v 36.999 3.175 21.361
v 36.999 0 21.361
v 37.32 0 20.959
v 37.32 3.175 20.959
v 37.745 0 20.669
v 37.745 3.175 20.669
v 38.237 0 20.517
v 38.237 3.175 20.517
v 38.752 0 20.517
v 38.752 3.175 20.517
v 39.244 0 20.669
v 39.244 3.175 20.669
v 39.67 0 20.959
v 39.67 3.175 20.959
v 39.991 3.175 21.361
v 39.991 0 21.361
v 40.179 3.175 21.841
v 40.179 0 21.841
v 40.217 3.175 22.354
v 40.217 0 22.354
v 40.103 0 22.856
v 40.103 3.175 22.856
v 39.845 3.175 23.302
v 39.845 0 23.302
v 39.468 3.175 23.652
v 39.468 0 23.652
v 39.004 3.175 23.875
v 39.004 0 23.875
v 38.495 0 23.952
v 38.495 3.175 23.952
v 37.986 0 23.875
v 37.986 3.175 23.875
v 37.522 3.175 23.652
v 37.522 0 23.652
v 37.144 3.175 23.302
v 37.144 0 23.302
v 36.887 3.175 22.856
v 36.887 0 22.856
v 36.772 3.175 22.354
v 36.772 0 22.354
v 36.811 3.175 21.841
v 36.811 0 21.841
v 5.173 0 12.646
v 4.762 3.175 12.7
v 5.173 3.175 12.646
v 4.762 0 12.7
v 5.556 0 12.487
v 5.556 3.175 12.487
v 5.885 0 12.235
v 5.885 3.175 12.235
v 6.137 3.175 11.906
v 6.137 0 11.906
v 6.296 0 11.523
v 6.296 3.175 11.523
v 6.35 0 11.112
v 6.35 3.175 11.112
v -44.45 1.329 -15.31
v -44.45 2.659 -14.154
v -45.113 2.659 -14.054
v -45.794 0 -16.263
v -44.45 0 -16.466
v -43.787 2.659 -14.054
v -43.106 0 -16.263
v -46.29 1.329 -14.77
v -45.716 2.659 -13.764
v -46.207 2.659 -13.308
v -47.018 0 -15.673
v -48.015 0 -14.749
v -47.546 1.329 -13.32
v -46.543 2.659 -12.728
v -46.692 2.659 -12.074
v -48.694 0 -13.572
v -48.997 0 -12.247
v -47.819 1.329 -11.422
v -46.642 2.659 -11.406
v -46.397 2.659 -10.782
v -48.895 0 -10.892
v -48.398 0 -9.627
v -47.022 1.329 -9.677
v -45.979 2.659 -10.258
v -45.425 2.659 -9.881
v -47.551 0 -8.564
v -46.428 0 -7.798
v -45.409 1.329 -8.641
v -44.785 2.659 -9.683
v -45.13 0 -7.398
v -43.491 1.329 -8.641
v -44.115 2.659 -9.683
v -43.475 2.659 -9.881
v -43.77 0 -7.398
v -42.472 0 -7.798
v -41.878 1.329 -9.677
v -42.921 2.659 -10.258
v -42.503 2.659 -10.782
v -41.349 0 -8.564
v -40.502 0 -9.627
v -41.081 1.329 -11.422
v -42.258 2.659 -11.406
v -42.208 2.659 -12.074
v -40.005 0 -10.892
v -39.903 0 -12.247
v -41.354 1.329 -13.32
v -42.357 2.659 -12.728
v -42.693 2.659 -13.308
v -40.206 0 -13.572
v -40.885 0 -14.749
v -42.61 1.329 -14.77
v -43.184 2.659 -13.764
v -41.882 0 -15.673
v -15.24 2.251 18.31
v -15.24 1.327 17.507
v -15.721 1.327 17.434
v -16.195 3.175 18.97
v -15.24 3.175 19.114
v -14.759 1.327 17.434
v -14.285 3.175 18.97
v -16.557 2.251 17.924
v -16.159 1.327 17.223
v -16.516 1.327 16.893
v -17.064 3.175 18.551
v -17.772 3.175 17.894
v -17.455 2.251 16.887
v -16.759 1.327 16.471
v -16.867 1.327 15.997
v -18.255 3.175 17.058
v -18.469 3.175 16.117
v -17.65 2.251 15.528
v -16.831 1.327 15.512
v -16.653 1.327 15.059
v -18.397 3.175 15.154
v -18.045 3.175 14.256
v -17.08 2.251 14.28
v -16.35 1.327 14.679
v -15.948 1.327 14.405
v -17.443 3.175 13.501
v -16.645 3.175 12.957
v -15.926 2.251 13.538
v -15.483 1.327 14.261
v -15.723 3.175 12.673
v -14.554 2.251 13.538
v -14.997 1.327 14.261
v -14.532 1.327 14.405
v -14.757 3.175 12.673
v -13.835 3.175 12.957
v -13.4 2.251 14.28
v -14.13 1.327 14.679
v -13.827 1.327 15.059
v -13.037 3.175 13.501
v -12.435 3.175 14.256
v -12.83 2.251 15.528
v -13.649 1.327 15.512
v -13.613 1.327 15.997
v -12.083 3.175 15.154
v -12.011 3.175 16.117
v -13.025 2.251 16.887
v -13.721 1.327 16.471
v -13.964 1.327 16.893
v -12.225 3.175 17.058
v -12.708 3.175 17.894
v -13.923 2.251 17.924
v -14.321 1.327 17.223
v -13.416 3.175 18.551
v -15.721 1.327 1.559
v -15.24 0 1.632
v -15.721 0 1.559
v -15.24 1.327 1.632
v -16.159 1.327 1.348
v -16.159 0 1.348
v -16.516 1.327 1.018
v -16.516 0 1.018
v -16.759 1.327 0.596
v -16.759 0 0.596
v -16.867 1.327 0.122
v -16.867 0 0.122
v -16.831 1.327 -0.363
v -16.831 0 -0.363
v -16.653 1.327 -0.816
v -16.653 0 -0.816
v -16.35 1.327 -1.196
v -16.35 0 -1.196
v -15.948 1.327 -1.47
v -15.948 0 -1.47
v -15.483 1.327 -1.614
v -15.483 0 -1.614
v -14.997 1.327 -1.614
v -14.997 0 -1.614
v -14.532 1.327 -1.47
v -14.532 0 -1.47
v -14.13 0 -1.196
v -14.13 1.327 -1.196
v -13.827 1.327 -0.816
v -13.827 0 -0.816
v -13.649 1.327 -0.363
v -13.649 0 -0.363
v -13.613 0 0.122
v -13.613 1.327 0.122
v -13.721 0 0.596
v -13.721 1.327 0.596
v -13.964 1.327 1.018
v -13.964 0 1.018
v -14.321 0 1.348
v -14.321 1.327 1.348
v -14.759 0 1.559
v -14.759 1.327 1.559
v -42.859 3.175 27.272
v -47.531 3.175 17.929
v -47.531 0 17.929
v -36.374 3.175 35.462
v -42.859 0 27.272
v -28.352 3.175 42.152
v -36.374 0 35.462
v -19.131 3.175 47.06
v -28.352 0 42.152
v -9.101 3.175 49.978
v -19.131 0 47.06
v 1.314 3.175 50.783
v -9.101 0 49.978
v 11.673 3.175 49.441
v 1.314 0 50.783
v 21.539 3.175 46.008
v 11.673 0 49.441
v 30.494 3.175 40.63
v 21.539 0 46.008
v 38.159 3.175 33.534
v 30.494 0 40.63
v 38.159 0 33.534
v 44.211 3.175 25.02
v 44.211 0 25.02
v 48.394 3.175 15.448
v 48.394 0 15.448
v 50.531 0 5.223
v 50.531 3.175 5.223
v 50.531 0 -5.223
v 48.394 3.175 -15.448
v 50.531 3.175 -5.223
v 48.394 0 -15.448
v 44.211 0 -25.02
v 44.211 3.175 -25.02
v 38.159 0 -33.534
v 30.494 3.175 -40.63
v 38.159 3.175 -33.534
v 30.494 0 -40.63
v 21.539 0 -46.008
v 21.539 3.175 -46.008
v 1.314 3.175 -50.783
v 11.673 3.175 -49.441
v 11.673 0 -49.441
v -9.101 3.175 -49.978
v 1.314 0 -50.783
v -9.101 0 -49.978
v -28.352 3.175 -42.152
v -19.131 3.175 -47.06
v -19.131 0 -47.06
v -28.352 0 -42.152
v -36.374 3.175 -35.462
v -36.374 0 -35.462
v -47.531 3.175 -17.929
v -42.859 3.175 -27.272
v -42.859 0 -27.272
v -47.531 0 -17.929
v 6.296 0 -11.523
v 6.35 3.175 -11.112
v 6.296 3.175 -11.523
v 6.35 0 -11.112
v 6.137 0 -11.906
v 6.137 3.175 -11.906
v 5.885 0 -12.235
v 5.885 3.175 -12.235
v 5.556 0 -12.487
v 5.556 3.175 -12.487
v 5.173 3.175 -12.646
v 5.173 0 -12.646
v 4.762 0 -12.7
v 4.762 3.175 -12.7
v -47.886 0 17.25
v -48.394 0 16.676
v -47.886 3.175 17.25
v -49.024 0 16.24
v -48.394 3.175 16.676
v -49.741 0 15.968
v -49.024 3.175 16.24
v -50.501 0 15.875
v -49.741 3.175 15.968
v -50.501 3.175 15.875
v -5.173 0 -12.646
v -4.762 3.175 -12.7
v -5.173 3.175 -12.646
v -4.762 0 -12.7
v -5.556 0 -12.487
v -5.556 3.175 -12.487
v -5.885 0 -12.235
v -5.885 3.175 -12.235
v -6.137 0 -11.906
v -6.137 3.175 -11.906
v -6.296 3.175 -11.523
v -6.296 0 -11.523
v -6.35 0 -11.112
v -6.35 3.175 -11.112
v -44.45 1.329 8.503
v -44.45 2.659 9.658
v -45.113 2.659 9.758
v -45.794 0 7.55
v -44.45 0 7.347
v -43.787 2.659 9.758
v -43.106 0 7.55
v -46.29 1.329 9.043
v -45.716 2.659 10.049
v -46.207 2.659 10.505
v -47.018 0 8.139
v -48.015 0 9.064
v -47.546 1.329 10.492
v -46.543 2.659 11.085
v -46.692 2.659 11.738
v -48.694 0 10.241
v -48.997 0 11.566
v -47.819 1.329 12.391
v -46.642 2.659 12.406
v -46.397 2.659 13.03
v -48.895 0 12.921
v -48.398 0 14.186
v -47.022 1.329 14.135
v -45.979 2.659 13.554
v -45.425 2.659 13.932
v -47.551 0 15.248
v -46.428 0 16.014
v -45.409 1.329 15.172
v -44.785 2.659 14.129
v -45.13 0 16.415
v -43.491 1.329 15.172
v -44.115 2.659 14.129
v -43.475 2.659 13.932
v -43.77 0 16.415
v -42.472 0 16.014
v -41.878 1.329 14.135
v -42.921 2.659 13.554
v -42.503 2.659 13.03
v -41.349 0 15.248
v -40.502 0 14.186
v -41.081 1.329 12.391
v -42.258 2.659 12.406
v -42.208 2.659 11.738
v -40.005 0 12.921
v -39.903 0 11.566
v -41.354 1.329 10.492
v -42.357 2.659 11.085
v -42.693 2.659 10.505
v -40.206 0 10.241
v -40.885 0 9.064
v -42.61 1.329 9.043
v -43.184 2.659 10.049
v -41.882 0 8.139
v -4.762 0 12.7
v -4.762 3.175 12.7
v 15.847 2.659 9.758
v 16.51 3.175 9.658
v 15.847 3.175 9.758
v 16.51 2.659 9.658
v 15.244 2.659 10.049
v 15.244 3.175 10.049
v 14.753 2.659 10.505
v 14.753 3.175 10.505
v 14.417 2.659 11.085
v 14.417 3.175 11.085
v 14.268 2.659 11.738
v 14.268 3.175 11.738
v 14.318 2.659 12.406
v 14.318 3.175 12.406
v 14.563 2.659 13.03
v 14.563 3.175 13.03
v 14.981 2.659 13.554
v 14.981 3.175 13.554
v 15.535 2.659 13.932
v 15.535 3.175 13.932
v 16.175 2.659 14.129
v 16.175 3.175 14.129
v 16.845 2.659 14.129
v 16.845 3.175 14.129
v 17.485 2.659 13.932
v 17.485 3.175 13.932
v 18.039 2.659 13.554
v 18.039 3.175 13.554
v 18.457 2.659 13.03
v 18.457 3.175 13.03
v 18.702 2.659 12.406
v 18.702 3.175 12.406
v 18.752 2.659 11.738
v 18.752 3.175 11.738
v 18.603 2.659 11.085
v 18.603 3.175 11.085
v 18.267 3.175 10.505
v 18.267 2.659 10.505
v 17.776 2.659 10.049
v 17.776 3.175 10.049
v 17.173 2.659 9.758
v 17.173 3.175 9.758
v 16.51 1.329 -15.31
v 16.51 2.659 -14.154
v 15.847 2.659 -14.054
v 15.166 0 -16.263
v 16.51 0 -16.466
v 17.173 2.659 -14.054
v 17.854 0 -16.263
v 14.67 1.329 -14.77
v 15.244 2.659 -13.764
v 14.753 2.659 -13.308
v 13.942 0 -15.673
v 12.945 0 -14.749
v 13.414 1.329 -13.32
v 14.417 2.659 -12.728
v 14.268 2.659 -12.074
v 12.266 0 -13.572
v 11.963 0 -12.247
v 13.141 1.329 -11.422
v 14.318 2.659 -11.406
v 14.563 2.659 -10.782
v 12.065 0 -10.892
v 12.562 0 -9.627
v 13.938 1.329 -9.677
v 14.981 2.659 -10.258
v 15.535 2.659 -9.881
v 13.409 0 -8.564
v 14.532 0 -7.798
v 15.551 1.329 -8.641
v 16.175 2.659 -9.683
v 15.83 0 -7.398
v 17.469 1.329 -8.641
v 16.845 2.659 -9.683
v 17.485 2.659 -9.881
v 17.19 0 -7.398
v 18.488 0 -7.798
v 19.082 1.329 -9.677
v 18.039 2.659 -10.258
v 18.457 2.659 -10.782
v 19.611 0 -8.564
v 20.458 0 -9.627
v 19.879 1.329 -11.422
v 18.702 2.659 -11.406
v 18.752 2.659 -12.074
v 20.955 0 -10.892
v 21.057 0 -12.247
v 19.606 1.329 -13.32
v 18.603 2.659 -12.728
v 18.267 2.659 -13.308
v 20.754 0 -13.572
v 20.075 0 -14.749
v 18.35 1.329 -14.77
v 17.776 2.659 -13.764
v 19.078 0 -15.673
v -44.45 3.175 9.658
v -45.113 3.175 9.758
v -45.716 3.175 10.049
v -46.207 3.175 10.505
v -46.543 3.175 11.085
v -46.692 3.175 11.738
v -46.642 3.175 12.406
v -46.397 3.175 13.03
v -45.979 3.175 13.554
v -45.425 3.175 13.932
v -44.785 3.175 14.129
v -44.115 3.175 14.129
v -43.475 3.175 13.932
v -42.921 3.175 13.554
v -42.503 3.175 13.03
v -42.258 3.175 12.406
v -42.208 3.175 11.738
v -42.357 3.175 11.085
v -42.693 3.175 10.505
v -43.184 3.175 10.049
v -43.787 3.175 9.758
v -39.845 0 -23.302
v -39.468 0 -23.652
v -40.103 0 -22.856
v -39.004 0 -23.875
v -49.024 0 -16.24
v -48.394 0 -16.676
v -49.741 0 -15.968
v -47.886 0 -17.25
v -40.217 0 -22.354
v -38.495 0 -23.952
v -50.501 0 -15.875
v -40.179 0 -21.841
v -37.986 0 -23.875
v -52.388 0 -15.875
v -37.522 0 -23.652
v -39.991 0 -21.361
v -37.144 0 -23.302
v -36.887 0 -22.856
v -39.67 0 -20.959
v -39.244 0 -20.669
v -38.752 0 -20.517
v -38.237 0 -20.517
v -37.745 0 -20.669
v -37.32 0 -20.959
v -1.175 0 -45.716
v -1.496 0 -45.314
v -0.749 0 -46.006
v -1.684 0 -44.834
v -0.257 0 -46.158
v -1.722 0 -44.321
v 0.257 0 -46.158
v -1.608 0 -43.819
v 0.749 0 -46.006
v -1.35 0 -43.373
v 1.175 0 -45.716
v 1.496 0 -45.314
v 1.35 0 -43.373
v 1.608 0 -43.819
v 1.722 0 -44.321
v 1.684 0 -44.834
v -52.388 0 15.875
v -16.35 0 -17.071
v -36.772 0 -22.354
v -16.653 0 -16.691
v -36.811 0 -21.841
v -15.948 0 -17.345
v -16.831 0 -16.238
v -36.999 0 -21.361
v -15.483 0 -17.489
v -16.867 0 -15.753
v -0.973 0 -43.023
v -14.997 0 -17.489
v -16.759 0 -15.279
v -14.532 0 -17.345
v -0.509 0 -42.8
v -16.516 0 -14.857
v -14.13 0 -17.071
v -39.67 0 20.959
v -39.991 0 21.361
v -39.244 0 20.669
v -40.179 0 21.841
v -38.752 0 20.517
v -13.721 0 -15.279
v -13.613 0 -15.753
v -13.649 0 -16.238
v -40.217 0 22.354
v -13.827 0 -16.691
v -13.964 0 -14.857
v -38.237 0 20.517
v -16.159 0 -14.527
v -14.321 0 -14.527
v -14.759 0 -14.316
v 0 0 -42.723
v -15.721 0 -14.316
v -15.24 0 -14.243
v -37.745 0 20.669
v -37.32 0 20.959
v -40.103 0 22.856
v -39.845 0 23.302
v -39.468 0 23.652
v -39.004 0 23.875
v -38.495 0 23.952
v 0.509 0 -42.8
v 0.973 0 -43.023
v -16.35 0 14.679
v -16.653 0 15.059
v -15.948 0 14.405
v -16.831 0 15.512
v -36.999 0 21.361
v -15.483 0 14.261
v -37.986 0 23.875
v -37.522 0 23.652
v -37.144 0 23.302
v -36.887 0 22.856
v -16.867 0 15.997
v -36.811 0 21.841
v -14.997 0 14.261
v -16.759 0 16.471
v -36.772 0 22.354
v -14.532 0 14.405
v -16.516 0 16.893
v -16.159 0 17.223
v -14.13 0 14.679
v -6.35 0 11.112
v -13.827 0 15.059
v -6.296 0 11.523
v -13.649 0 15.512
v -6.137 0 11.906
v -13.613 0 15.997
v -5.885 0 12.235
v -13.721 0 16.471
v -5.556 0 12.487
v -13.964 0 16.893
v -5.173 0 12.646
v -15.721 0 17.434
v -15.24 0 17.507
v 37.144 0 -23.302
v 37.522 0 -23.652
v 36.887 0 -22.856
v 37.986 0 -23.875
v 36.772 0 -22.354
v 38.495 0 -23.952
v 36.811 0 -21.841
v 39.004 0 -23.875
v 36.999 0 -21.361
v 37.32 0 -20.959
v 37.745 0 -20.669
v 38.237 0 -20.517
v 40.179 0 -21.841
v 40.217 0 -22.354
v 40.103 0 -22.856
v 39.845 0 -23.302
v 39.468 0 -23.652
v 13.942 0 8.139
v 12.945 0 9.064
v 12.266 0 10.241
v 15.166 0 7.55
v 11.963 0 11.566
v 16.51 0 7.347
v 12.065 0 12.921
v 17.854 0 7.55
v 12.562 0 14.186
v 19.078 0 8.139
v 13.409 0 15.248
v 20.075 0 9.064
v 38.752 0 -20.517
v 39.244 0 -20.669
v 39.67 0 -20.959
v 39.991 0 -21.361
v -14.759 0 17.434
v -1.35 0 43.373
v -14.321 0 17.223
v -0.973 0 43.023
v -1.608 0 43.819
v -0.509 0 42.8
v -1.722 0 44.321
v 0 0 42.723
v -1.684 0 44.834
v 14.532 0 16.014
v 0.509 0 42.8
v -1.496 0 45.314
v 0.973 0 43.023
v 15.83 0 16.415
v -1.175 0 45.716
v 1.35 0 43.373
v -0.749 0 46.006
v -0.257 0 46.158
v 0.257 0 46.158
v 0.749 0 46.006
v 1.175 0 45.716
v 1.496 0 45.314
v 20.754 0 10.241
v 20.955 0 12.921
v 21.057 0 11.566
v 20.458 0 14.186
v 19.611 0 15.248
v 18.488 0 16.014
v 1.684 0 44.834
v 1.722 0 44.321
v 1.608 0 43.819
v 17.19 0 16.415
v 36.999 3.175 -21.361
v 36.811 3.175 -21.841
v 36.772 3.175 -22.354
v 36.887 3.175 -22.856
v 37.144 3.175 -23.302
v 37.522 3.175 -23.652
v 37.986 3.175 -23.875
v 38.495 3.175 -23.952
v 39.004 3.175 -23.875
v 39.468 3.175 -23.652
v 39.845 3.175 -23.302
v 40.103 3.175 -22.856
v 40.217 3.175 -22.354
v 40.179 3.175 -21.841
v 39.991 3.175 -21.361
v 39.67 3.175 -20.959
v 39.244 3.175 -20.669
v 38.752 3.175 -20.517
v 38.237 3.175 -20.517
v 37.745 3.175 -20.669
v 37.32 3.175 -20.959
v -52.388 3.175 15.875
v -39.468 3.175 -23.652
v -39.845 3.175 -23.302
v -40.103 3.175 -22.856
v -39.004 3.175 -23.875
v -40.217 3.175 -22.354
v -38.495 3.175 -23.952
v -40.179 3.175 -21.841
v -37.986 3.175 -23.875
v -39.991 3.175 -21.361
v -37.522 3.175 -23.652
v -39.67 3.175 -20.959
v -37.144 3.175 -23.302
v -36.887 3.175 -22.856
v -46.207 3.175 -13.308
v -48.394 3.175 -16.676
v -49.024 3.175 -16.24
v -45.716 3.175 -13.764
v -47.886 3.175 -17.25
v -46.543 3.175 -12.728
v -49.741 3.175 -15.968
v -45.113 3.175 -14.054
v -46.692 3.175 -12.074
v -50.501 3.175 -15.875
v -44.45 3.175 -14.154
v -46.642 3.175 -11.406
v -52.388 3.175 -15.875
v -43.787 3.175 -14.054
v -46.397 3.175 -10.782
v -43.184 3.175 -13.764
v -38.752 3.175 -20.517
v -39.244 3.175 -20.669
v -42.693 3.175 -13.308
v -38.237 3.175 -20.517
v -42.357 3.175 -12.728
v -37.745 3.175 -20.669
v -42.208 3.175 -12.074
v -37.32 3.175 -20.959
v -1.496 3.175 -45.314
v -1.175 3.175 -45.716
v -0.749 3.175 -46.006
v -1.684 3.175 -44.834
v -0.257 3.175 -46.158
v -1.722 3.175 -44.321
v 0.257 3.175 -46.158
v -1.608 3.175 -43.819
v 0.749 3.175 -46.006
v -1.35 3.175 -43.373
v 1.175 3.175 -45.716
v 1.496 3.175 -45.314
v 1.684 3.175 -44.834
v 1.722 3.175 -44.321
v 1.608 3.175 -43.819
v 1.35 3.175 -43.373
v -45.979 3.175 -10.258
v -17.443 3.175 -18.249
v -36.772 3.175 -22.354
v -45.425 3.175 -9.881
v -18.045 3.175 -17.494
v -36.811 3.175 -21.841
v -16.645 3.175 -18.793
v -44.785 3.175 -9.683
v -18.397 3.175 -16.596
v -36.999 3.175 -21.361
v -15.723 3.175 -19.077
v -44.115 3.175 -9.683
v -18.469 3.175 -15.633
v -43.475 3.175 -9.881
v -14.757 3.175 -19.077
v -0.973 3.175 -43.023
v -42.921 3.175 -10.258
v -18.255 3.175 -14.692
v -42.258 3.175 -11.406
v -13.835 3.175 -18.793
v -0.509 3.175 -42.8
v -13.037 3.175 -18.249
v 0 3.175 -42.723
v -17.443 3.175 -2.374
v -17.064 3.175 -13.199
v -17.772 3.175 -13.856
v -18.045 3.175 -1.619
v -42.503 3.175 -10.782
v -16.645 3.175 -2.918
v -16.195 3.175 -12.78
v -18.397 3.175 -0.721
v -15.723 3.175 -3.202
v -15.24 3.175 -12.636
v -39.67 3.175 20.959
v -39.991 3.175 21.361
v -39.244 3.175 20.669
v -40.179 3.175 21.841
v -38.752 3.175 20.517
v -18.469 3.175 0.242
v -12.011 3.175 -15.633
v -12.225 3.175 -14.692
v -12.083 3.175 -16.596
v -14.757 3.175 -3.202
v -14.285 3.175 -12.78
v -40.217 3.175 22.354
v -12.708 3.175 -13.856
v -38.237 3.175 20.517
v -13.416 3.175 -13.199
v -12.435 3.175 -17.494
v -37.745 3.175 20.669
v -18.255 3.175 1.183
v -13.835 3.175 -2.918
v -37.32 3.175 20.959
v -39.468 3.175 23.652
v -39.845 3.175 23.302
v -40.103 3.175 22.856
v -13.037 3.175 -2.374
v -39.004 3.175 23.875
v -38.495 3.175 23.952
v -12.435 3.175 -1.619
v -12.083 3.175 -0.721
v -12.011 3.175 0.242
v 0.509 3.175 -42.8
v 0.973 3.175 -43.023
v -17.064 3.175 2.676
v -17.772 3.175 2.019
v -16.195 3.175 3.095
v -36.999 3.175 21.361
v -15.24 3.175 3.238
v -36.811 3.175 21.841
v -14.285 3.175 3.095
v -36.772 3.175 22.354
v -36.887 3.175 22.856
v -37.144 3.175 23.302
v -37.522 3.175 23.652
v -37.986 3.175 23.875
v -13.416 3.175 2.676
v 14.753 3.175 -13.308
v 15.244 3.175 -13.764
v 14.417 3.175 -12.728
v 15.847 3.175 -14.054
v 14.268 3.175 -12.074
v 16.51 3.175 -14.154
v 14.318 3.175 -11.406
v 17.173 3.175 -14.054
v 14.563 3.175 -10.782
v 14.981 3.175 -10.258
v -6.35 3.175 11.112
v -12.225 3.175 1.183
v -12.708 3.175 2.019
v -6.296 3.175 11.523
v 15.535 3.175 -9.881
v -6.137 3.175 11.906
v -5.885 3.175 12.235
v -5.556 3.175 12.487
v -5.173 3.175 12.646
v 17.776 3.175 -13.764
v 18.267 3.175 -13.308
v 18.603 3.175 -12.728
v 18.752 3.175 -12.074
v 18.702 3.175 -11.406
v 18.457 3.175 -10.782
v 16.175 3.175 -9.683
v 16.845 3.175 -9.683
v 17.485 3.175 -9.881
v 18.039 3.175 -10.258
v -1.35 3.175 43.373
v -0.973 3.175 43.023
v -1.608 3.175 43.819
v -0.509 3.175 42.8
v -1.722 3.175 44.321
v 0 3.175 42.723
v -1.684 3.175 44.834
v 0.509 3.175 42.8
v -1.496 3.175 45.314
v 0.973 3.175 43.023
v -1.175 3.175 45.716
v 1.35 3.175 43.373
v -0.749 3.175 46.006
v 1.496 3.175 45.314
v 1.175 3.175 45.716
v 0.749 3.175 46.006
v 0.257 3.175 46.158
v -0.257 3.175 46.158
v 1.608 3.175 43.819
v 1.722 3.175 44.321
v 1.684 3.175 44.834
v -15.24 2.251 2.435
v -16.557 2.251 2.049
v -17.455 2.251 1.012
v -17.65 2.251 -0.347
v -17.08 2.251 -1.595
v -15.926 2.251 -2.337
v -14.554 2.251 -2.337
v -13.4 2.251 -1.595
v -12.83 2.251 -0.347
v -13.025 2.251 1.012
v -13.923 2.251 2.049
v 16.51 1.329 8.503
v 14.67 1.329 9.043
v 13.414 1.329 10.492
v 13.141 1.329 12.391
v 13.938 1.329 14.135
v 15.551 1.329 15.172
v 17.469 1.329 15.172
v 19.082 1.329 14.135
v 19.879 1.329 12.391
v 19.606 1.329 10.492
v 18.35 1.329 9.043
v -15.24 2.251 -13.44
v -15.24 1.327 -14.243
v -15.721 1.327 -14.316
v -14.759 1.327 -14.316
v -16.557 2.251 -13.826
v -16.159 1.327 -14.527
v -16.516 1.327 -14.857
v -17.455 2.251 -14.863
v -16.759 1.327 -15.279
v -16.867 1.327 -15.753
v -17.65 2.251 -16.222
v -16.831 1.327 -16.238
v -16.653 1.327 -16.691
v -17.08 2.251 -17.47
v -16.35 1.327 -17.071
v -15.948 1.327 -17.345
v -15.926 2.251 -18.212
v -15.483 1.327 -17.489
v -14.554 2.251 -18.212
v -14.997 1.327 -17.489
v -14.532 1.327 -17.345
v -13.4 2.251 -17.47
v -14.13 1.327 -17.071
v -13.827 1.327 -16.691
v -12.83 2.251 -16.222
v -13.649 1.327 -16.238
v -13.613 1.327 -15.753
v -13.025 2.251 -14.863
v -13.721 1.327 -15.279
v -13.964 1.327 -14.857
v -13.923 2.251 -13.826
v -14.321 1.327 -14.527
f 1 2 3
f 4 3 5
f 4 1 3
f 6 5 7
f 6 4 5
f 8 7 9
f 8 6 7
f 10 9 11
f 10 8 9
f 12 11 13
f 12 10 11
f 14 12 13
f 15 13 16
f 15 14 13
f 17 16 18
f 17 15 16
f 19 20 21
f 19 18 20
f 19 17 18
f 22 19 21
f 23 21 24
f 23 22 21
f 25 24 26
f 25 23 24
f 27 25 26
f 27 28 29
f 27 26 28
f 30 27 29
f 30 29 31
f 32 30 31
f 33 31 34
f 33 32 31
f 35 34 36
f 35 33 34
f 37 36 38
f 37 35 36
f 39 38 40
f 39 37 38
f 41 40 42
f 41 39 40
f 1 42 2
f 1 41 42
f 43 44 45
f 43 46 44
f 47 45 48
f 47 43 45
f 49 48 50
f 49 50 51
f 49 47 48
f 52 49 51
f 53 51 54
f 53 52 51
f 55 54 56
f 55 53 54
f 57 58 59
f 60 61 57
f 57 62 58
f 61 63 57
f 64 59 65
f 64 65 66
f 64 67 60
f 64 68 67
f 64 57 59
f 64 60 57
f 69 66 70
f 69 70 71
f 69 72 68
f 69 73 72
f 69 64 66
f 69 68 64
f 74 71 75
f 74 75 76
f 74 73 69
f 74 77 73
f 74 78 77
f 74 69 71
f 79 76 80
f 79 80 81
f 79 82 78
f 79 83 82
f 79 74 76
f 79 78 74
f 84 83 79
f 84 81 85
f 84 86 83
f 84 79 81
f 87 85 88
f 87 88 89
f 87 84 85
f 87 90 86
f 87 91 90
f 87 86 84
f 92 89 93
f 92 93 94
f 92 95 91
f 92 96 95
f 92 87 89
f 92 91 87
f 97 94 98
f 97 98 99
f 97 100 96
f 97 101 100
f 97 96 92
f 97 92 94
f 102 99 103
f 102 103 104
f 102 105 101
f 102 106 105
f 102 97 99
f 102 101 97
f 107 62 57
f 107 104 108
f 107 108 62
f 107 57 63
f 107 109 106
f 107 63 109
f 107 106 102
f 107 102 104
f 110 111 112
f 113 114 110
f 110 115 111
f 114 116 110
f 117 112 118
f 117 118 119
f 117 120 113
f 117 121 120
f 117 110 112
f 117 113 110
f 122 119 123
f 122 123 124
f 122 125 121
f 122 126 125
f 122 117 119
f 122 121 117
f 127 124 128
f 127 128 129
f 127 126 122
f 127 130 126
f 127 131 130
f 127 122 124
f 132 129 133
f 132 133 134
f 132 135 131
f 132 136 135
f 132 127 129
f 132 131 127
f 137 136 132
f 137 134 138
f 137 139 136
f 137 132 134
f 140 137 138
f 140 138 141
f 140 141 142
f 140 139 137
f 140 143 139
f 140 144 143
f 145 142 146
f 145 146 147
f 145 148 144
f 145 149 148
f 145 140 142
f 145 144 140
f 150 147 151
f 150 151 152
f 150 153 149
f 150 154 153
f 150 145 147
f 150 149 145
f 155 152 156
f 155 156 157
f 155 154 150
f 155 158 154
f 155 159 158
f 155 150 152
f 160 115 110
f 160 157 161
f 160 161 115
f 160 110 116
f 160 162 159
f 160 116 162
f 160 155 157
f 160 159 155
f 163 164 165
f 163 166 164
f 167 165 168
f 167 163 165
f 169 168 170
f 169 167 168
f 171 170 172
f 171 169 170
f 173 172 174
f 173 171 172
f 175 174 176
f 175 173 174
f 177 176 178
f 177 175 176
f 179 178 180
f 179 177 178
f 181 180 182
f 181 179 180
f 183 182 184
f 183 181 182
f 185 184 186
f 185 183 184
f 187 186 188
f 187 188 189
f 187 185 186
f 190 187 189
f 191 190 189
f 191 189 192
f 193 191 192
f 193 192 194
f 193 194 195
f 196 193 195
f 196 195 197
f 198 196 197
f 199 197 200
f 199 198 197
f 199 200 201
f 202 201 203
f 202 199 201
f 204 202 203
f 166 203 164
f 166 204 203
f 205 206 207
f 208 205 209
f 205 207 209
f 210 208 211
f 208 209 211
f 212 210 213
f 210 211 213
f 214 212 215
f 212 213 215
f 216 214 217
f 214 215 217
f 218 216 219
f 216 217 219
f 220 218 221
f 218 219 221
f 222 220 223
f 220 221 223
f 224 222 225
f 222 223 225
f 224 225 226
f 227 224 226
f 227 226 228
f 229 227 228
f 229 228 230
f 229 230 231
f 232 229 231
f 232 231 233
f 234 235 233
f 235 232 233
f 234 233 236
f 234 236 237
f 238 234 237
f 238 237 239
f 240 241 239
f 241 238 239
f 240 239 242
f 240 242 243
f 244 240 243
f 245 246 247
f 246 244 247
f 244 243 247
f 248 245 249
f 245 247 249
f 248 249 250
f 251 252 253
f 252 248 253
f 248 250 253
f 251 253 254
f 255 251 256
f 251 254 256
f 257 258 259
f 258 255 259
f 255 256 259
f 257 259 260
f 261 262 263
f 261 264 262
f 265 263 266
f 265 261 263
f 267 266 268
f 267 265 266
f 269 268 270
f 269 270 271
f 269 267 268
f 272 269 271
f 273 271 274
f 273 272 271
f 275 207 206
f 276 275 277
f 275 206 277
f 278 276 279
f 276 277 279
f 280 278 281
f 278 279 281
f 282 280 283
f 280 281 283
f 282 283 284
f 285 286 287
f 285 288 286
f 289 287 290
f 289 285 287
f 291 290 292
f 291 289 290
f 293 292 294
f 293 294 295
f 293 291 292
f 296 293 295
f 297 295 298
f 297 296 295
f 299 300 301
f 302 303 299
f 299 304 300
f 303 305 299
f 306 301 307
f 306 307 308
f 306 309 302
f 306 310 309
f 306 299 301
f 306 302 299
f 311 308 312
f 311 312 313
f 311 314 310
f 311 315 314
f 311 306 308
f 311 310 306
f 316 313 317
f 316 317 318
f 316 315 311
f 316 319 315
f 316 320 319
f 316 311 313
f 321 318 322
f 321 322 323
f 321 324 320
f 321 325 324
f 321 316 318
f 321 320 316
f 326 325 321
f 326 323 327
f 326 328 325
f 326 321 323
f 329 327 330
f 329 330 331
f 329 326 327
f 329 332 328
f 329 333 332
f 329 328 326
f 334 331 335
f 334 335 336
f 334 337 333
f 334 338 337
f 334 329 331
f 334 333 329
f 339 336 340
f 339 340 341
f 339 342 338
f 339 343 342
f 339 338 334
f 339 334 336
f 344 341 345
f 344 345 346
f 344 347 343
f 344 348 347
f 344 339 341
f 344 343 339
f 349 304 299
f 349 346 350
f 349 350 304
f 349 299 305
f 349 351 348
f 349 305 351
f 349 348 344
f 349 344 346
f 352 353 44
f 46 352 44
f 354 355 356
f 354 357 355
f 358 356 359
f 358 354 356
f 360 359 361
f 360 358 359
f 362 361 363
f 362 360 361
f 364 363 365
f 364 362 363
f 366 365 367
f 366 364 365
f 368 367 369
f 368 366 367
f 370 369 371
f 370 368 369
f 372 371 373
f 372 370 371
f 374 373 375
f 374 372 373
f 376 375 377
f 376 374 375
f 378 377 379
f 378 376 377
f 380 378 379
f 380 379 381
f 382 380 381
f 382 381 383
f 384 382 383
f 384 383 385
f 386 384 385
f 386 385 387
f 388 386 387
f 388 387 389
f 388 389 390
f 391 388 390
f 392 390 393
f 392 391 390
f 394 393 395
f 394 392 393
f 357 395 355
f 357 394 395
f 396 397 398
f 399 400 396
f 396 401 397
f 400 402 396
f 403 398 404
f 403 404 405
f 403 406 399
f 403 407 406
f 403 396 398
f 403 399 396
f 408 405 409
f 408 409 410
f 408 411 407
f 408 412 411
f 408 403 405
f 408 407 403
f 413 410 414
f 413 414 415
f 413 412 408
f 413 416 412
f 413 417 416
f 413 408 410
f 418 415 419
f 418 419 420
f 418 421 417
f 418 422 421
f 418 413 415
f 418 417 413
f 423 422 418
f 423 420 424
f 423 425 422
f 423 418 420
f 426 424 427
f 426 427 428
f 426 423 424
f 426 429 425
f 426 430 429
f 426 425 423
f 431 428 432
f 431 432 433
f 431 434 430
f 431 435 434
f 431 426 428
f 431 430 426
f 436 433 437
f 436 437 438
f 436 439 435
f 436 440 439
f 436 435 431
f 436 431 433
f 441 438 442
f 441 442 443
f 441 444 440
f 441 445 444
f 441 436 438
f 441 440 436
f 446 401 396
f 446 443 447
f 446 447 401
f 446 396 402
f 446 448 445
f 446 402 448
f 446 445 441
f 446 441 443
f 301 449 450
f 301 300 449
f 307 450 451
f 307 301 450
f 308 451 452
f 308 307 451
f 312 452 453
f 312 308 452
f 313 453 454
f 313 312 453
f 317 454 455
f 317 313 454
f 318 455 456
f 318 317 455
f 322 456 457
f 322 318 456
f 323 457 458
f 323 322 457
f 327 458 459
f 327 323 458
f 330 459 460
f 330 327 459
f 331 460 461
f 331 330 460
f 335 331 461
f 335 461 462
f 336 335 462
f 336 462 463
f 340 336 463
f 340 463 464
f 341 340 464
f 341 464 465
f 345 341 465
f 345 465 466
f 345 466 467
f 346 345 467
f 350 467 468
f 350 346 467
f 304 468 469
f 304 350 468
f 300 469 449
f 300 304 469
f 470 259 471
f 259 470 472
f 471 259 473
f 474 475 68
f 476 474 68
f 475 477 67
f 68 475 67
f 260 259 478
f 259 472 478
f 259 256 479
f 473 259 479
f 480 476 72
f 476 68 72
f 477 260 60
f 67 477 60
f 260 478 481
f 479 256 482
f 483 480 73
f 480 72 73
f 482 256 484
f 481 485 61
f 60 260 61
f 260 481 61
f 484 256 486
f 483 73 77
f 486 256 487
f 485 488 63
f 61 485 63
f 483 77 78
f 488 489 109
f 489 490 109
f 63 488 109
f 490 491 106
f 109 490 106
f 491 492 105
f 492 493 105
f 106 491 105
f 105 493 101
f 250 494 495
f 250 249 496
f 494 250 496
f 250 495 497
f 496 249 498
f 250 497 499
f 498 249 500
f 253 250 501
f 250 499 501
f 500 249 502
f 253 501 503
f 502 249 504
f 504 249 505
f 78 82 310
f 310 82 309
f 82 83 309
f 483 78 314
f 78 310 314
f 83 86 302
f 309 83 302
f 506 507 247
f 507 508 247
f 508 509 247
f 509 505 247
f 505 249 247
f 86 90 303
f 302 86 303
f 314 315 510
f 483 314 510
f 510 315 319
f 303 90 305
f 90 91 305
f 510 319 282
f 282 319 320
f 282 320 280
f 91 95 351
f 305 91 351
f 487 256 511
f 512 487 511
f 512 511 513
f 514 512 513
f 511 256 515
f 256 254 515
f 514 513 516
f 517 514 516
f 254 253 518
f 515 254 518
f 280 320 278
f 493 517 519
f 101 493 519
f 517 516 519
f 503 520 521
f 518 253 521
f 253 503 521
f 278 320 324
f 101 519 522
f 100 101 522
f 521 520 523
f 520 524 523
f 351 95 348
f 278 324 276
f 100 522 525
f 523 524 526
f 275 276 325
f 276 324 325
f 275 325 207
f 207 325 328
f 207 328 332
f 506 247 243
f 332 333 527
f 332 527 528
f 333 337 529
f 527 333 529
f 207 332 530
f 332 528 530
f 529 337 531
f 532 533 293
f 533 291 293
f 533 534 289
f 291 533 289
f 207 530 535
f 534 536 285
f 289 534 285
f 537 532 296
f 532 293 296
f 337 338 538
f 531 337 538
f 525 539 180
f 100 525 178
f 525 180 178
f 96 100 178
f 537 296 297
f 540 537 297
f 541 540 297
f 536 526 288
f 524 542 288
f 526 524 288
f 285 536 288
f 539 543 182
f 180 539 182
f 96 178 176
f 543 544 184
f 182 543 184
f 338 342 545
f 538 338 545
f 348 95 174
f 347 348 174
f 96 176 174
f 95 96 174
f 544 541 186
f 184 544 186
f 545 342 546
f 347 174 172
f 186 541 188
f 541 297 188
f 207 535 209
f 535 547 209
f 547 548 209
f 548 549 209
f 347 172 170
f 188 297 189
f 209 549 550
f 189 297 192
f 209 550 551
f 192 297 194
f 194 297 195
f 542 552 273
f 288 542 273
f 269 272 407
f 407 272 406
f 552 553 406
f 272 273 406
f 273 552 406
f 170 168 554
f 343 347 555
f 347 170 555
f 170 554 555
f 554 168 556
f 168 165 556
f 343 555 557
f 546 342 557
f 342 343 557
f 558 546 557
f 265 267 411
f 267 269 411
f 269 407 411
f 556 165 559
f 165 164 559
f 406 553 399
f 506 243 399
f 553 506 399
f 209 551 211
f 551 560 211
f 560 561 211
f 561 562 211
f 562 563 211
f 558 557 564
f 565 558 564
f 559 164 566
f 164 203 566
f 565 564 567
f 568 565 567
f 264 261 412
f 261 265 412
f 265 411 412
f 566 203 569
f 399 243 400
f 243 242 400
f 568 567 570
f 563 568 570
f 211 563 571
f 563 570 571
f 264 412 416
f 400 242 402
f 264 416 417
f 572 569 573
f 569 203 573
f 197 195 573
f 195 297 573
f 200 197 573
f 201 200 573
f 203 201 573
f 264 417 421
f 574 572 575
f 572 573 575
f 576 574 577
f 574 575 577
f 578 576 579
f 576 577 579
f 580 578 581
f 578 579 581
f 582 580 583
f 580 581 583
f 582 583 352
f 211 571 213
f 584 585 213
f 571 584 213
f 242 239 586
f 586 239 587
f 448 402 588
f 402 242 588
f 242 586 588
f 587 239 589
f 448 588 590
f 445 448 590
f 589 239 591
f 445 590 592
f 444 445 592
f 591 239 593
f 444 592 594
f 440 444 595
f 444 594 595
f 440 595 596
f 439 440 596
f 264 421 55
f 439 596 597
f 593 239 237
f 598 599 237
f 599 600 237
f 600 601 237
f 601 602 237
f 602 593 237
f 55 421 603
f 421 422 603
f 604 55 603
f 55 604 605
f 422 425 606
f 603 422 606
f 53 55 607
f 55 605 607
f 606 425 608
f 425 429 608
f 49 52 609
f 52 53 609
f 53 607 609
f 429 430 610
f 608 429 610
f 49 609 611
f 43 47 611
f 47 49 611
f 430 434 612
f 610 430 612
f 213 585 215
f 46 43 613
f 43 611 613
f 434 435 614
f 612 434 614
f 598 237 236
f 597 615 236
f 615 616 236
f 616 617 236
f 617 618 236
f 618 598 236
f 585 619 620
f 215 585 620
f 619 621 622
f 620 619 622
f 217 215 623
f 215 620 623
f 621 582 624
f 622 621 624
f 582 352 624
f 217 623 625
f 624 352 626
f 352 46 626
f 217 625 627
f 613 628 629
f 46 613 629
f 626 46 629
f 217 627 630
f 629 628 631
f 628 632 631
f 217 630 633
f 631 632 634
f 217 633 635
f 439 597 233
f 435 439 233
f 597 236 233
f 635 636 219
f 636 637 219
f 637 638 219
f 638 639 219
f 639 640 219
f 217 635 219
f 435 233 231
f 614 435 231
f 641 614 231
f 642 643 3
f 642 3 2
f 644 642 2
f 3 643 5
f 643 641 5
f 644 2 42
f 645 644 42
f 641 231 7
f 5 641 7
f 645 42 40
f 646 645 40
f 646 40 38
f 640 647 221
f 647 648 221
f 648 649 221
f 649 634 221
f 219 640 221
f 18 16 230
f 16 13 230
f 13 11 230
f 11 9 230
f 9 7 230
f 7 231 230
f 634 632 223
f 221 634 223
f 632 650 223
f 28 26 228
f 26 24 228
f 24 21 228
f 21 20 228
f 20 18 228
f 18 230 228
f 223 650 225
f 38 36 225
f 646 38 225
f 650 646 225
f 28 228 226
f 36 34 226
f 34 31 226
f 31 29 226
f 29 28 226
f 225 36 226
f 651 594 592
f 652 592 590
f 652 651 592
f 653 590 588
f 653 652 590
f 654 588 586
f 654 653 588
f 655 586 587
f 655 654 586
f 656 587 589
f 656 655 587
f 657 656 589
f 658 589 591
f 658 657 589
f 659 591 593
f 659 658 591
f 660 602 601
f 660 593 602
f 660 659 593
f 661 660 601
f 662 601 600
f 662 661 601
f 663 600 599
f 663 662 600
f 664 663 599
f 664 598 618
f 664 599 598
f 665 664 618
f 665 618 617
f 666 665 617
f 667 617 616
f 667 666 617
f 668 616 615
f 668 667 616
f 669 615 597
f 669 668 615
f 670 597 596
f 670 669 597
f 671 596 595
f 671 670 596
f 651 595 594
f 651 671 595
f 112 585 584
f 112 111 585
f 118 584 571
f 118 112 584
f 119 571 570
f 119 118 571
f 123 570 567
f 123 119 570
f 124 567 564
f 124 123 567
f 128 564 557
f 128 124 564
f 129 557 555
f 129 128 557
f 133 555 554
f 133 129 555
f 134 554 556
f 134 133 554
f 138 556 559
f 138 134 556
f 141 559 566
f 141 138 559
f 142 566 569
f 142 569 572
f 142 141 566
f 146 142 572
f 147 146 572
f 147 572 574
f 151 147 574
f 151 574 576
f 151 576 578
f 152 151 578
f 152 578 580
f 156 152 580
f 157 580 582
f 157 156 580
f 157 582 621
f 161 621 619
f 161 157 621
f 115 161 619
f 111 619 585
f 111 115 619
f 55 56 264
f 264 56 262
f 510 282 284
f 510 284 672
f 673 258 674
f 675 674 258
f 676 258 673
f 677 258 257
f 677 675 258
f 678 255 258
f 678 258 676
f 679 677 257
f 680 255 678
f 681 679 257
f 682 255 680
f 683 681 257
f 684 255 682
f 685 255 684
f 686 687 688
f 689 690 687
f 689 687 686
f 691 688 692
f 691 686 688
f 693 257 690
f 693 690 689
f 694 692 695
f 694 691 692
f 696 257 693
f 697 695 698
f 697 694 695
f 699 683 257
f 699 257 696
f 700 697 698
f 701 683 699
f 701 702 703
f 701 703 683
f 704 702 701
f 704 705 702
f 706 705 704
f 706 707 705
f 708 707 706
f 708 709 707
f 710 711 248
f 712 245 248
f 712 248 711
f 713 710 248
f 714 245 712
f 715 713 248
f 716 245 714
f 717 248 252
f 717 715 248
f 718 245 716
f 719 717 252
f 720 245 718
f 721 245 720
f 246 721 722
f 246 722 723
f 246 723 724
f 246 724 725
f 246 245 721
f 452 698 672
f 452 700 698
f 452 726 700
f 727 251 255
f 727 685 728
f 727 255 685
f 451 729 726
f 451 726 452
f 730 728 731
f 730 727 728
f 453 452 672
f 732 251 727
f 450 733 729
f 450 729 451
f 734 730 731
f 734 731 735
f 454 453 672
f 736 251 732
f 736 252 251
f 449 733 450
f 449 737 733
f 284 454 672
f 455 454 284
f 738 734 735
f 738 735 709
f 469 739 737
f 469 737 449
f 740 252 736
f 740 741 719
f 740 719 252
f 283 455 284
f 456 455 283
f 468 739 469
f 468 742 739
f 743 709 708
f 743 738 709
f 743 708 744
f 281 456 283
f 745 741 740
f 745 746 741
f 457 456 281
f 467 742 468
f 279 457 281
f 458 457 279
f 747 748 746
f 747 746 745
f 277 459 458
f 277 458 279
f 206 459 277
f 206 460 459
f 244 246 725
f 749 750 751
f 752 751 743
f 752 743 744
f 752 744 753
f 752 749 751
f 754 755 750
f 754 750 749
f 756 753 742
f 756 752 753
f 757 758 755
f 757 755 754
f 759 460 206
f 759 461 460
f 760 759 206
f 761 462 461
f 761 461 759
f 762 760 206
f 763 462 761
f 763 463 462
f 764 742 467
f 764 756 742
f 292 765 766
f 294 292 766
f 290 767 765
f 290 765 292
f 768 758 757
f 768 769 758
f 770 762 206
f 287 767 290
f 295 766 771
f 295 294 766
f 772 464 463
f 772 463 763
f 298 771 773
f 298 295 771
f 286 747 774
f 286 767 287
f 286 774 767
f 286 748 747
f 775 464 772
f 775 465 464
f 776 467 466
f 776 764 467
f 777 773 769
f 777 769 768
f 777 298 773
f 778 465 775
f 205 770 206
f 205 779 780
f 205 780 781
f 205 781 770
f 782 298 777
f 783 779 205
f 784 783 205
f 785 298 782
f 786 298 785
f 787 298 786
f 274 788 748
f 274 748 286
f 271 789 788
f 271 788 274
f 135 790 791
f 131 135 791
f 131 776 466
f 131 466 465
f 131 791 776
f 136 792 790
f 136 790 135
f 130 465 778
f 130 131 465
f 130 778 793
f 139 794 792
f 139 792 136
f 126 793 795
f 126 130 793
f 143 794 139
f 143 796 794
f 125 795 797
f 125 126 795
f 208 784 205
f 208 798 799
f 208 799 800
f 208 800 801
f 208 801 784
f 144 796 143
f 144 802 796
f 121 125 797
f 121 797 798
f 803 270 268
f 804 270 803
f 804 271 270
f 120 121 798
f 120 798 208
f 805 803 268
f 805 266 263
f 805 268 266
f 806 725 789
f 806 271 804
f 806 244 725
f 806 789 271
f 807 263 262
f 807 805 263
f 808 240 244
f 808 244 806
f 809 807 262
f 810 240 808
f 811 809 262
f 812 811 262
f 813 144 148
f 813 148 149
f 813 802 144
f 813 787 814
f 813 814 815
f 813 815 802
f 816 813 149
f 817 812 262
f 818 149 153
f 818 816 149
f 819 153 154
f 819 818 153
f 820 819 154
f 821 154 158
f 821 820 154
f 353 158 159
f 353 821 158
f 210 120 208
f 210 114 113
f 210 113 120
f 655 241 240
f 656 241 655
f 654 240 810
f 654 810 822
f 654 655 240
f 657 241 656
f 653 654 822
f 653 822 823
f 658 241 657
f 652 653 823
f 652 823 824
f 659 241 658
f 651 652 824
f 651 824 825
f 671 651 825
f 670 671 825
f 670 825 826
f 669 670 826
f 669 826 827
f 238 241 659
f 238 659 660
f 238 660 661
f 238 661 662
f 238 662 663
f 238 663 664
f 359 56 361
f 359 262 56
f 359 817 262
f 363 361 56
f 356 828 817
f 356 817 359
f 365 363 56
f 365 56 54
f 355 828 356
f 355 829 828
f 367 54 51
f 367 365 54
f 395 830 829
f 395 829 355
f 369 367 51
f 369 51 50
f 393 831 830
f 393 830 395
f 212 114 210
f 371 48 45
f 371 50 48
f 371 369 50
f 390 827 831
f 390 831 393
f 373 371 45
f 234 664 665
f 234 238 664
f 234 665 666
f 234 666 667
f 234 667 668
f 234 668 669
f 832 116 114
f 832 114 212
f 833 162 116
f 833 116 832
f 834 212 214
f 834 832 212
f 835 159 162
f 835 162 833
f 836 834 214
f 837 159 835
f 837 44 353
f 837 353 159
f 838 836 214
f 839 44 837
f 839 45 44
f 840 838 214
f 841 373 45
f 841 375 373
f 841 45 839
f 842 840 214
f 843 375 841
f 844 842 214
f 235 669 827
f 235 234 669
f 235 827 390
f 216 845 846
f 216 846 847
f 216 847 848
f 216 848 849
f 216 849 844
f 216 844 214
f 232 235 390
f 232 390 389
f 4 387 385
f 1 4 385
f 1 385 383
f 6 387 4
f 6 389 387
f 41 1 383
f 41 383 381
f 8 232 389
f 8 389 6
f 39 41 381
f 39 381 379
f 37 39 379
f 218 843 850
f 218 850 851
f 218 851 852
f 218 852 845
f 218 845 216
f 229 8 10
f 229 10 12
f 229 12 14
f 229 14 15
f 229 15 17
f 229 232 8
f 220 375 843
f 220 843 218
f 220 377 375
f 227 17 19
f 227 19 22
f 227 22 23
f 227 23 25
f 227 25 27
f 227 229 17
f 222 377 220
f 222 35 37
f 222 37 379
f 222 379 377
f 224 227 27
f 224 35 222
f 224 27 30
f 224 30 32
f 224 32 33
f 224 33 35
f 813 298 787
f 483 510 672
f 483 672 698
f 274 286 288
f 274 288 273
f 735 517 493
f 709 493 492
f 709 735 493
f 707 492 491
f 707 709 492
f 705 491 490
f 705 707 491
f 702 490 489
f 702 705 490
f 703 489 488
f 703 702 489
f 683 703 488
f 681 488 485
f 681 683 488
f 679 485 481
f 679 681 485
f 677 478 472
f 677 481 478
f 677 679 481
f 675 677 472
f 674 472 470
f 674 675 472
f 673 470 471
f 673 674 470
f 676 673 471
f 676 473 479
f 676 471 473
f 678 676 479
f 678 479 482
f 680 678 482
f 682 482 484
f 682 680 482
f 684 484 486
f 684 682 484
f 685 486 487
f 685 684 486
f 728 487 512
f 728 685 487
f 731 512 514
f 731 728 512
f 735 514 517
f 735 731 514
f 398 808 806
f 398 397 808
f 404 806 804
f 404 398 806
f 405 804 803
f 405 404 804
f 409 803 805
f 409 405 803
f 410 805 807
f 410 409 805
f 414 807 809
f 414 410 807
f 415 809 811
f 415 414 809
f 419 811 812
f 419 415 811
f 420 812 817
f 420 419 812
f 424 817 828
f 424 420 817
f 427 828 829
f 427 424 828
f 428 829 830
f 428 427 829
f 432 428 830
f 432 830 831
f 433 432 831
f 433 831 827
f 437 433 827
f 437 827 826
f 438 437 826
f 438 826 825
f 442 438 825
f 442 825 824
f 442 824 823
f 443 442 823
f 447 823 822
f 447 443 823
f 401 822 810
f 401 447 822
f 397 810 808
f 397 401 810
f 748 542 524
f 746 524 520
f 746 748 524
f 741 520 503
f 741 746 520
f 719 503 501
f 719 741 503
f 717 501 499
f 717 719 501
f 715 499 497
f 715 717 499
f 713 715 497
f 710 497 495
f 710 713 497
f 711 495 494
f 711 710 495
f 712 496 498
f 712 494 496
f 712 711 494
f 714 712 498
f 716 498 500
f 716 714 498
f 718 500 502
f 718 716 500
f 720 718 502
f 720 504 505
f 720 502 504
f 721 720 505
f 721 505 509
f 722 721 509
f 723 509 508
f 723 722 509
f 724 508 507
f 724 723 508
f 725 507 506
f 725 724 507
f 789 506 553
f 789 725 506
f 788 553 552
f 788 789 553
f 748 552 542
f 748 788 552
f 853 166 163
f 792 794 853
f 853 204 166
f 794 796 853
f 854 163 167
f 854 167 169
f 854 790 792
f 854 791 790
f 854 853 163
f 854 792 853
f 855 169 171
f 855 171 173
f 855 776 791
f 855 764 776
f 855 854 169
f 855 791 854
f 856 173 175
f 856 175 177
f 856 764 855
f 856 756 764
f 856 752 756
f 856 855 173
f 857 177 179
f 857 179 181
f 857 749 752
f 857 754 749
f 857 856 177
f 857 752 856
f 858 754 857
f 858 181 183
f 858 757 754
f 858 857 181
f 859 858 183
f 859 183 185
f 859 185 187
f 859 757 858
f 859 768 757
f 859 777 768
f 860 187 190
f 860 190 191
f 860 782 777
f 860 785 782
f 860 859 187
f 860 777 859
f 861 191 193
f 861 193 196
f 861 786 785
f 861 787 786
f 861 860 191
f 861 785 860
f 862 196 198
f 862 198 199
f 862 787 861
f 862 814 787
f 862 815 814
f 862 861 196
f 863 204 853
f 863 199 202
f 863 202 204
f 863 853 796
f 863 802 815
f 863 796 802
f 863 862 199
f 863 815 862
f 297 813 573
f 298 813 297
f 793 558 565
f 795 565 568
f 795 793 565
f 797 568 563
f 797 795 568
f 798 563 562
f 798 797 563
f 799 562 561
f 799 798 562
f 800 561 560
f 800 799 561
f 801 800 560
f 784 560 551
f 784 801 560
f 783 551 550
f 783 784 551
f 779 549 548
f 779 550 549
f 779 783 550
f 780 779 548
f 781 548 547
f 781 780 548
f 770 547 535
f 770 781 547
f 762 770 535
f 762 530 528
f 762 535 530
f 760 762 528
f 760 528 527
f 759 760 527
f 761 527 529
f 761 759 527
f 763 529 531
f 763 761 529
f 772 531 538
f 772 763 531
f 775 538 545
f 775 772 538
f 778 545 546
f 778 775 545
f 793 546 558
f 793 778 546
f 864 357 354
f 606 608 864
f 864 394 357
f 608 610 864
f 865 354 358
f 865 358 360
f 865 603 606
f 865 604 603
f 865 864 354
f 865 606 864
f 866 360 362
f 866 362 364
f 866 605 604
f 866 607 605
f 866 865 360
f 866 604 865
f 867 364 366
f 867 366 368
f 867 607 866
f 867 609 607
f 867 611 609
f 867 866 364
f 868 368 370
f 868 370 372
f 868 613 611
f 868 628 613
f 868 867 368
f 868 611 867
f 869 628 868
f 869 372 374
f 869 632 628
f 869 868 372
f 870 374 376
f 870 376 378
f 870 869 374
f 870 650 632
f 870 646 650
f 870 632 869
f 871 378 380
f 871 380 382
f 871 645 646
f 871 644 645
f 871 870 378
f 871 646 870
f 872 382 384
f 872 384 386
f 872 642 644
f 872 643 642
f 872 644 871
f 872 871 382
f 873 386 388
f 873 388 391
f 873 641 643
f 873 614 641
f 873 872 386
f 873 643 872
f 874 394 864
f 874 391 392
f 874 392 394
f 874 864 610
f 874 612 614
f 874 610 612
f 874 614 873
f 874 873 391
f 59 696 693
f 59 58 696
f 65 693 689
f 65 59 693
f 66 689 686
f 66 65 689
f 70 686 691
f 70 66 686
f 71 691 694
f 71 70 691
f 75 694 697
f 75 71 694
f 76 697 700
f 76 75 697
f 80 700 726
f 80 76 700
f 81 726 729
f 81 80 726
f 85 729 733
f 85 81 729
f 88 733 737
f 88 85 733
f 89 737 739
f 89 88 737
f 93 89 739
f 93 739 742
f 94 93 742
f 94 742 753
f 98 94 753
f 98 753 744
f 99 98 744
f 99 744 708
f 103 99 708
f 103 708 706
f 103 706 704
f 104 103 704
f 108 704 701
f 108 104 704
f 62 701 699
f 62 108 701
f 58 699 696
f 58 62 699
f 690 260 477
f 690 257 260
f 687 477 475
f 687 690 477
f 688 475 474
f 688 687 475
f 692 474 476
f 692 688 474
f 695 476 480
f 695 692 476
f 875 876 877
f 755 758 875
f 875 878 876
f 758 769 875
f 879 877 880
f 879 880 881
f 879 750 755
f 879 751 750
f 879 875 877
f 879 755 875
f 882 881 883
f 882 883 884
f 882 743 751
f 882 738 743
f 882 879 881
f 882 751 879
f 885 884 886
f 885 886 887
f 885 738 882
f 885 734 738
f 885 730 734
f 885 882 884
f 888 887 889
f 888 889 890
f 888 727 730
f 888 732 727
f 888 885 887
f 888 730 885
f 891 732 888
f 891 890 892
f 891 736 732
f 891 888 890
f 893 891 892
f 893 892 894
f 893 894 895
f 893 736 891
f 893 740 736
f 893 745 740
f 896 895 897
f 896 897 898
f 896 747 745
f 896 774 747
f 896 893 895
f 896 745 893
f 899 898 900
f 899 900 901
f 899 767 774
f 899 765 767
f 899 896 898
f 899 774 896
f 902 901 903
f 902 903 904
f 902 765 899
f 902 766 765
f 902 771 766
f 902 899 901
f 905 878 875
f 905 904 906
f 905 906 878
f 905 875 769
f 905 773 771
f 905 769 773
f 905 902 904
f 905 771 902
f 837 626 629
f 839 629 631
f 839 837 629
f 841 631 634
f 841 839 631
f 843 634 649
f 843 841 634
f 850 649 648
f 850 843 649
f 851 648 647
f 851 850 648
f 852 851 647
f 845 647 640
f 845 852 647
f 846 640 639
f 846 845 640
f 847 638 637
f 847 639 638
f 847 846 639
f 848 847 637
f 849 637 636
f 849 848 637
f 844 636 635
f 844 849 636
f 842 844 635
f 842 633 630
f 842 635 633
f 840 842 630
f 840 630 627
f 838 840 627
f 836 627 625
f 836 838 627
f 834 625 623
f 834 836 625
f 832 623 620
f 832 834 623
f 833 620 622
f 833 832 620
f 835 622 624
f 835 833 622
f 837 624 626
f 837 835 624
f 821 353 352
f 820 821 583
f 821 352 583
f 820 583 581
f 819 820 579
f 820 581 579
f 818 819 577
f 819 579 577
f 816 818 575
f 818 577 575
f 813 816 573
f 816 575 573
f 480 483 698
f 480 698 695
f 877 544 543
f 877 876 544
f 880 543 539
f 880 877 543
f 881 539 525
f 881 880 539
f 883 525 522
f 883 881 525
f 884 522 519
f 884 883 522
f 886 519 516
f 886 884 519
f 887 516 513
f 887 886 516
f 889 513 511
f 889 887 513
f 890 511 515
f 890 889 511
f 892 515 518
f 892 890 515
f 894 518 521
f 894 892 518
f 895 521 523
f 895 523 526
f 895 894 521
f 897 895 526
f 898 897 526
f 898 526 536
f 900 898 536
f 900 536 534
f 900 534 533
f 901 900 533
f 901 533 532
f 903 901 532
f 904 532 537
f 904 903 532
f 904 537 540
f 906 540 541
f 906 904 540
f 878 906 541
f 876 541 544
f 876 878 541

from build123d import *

# Parameters (mm, degrees)
SKETCH1_R                                     = 50.8
BOSS_EXTRUDE1_DEPTH                           = 3.175
BOSS_EXTRUDE2_DEPTH                           = 3.175
FILLET1_R                                     = 3.175
CSK_FOR_8_FLAT_HEAD_SOCKET_CAP_SCREW1_A_COUNT = 2
CSK_FOR_8_FLAT_HEAD_SOCKET_CAP_SCREW1_A_PITCH = 23.8125
CSK_FOR_8_FLAT_HEAD_SOCKET_CAP_SCRE_2_COUNT   = 2
CSK_FOR_8_FLAT_HEAD_SOCKET_CAP_SCRE_2_PITCH   = 65.445830702
CSK_FOR_8_FLAT_HEAD_SOCKET_CAP_SCRE_3_COUNT   = 2
CSK_FOR_8_FLAT_HEAD_SOCKET_CAP_SCRE_3_PITCH   = 60.96
CIRPATTERN1_COUNT                             = 6
CSK_FOR_4_FLAT_HEAD_SOCKET_CAP_SCREW2_A_COUNT = 2
CSK_FOR_4_FLAT_HEAD_SOCKET_CAP_SCREW2_A_PITCH = 15.875
CSK_FOR_4_FLAT_HEAD_SOCKET_CAP_SCRE_2_COUNT   = 2
CSK_FOR_4_FLAT_HEAD_SOCKET_CAP_SCRE_2_PITCH   = 15.875
SKETCH17_W                                    = 12.7
SKETCH17_H                                    = 25.4
CUT_EXTRUDE2_DEPTH                            = 74.042253397
FILLET2_R                                     = 1.5875


with BuildPart() as part:
    # Sketch1 → Boss-Extrude1 (new body)
    with BuildSketch(Plane(origin=(0, 0, 0), x_dir=(1, 0, 0), z_dir=(0, 1, 0))):
        with Locations(Location((0, 0, 0), (0, 0, 270))):
            Circle(SKETCH1_R)
    extrude(amount=BOSS_EXTRUDE1_DEPTH)

    # Sketch8 → Boss-Extrude2 (add)
    with BuildSketch(Plane.XZ):
        with BuildLine():
            Line((-52.3875, -15.875), (-48.255822188, -15.875))
            ThreePointArc((-48.255822188, -15.875), (-50.8, 0), (-48.255822188, 15.875))
            Line((-48.255822188, 15.875), (-52.3875, 15.875))
            Line((-52.3875, 15.875), (-52.3875, -15.875))
        make_face()
    extrude(amount=-BOSS_EXTRUDE2_DEPTH)

    # Fillet1
    fillet1_edges = [part.edges().sort_by_distance(p)[0] for p in [
        (-48.255822188, 1.5875, 15.875),
        (-48.255822188, 1.5875, -15.875),
    ]]
    fillet(fillet1_edges, radius=FILLET1_R)

    # Sketch6 → CSK for #8 Flat Head Socket Cap Screw1 (revolve, cut)
    with BuildSketch(Plane(origin=(-44.45, 0, 11.90625), x_dir=(0, 0, -1), z_dir=(1, 0, 0))):
        Polygon((0, 0), (0, 3.175), (2.2479, 3.175), (2.2479, 2.658961536), (4.5593, 0), align=None)
    csk_for_8_flat_head_socket_cap_screw1 = revolve(axis=Axis((-44.45, -6.35, 11.90625), (0, 1, 0)), mode=Mode.SUBTRACT)

    # CSK for #8 Flat Head Socket Cap Screw1 a: CSK for #8 Flat Head Socket Cap Screw1 ×2
    with Locations(*[(0, 0, -i * CSK_FOR_8_FLAT_HEAD_SOCKET_CAP_SCREW1_A_PITCH) for i in range(1, CSK_FOR_8_FLAT_HEAD_SOCKET_CAP_SCREW1_A_COUNT)]):
        add(csk_for_8_flat_head_socket_cap_screw1, mode=Mode.SUBTRACT)

    # CSK for _8 Flat Head Socket Cap Scre 2: CSK for #8 Flat Head Socket Cap Screw1 ×2
    with Locations(*[Vector(0.9314573494796193, 0, -0.36385052714047633) * (i * CSK_FOR_8_FLAT_HEAD_SOCKET_CAP_SCRE_2_PITCH) for i in range(1, CSK_FOR_8_FLAT_HEAD_SOCKET_CAP_SCRE_2_COUNT)]):
        add(csk_for_8_flat_head_socket_cap_screw1, mode=Mode.SUBTRACT)

    # CSK for _8 Flat Head Socket Cap Scre 3: CSK for #8 Flat Head Socket Cap Screw1 ×2
    with Locations(*[(i * CSK_FOR_8_FLAT_HEAD_SOCKET_CAP_SCRE_3_PITCH, 0, 0) for i in range(1, CSK_FOR_8_FLAT_HEAD_SOCKET_CAP_SCRE_3_COUNT)]):
        add(csk_for_8_flat_head_socket_cap_screw1, mode=Mode.SUBTRACT)

    # Sketch10 → #8-32 Tapped Hole1 (revolve, cut)
    with BuildSketch(Plane(origin=(0, 3.175, -44.45), x_dir=(0, 0, 1), z_dir=(1, 0, 0))):
        Polygon((0, 0), (0, 11.705806461), (1.7272, 10.668), (1.7272, 0), align=None)
    f_8_32_tapped_hole1 = revolve(axis=Axis((0, 9.525, -44.45), (0, -1, 0)), mode=Mode.SUBTRACT)

    # CirPattern1: #8-32 Tapped Hole1 ×6 about axis
    cirpattern1_axis = Axis((0, 0, 0), (0, 1, 0))
    for i in range(1, CIRPATTERN1_COUNT):
        add(f_8_32_tapped_hole1.rotate(cirpattern1_axis, i * 360 / CIRPATTERN1_COUNT), mode=Mode.SUBTRACT)

    # Sketch15 → CSK for #4 Flat Head Socket Cap Screw2 (revolve, cut)
    with BuildSketch(Plane(origin=(-15.24, 3.175, 0), x_dir=(0, 0, 1), z_dir=(1, 0, 0))):
        Polygon((0, 0), (0, 3.175), (1.63195, 3.175), (1.63195, 1.848124365), (3.2385, 0), align=None)
    csk_for_4_flat_head_socket_cap_screw2 = revolve(axis=Axis((-15.24, 9.525, 0), (0, -1, 0)), mode=Mode.SUBTRACT)

    # CSK for #4 Flat Head Socket Cap Screw2 a: CSK for #4 Flat Head Socket Cap Screw2 ×2
    with Locations(*[(0, 0, -i * CSK_FOR_4_FLAT_HEAD_SOCKET_CAP_SCREW2_A_PITCH) for i in range(1, CSK_FOR_4_FLAT_HEAD_SOCKET_CAP_SCREW2_A_COUNT)]):
        add(csk_for_4_flat_head_socket_cap_screw2, mode=Mode.SUBTRACT)

    # CSK for _4 Flat Head Socket Cap Scre 2: CSK for #4 Flat Head Socket Cap Screw2 ×2
    with Locations(*[(0, 0, i * CSK_FOR_4_FLAT_HEAD_SOCKET_CAP_SCRE_2_PITCH) for i in range(1, CSK_FOR_4_FLAT_HEAD_SOCKET_CAP_SCRE_2_COUNT)]):
        add(csk_for_4_flat_head_socket_cap_screw2, mode=Mode.SUBTRACT)

    # Sketch17 → Cut-Extrude2 (cut, through all)
    with BuildSketch(Plane(origin=(0, 3.175, 0), x_dir=(1, 0, 0), z_dir=(0, 1, 0))):
        Rectangle(SKETCH17_W, SKETCH17_H)
    extrude(amount=-CUT_EXTRUDE2_DEPTH, mode=Mode.SUBTRACT)

    # Fillet2
    fillet2_edges = [part.edges().sort_by_distance(p)[0] for p in [
        (-6.35, 1.5875, 12.7),
        (-6.35, 1.5875, -12.7),
        (6.35, 1.5875, -12.7),
        (6.35, 1.5875, 12.7),
    ]]
    fillet(fillet2_edges, radius=FILLET2_R)


solid = part.part
